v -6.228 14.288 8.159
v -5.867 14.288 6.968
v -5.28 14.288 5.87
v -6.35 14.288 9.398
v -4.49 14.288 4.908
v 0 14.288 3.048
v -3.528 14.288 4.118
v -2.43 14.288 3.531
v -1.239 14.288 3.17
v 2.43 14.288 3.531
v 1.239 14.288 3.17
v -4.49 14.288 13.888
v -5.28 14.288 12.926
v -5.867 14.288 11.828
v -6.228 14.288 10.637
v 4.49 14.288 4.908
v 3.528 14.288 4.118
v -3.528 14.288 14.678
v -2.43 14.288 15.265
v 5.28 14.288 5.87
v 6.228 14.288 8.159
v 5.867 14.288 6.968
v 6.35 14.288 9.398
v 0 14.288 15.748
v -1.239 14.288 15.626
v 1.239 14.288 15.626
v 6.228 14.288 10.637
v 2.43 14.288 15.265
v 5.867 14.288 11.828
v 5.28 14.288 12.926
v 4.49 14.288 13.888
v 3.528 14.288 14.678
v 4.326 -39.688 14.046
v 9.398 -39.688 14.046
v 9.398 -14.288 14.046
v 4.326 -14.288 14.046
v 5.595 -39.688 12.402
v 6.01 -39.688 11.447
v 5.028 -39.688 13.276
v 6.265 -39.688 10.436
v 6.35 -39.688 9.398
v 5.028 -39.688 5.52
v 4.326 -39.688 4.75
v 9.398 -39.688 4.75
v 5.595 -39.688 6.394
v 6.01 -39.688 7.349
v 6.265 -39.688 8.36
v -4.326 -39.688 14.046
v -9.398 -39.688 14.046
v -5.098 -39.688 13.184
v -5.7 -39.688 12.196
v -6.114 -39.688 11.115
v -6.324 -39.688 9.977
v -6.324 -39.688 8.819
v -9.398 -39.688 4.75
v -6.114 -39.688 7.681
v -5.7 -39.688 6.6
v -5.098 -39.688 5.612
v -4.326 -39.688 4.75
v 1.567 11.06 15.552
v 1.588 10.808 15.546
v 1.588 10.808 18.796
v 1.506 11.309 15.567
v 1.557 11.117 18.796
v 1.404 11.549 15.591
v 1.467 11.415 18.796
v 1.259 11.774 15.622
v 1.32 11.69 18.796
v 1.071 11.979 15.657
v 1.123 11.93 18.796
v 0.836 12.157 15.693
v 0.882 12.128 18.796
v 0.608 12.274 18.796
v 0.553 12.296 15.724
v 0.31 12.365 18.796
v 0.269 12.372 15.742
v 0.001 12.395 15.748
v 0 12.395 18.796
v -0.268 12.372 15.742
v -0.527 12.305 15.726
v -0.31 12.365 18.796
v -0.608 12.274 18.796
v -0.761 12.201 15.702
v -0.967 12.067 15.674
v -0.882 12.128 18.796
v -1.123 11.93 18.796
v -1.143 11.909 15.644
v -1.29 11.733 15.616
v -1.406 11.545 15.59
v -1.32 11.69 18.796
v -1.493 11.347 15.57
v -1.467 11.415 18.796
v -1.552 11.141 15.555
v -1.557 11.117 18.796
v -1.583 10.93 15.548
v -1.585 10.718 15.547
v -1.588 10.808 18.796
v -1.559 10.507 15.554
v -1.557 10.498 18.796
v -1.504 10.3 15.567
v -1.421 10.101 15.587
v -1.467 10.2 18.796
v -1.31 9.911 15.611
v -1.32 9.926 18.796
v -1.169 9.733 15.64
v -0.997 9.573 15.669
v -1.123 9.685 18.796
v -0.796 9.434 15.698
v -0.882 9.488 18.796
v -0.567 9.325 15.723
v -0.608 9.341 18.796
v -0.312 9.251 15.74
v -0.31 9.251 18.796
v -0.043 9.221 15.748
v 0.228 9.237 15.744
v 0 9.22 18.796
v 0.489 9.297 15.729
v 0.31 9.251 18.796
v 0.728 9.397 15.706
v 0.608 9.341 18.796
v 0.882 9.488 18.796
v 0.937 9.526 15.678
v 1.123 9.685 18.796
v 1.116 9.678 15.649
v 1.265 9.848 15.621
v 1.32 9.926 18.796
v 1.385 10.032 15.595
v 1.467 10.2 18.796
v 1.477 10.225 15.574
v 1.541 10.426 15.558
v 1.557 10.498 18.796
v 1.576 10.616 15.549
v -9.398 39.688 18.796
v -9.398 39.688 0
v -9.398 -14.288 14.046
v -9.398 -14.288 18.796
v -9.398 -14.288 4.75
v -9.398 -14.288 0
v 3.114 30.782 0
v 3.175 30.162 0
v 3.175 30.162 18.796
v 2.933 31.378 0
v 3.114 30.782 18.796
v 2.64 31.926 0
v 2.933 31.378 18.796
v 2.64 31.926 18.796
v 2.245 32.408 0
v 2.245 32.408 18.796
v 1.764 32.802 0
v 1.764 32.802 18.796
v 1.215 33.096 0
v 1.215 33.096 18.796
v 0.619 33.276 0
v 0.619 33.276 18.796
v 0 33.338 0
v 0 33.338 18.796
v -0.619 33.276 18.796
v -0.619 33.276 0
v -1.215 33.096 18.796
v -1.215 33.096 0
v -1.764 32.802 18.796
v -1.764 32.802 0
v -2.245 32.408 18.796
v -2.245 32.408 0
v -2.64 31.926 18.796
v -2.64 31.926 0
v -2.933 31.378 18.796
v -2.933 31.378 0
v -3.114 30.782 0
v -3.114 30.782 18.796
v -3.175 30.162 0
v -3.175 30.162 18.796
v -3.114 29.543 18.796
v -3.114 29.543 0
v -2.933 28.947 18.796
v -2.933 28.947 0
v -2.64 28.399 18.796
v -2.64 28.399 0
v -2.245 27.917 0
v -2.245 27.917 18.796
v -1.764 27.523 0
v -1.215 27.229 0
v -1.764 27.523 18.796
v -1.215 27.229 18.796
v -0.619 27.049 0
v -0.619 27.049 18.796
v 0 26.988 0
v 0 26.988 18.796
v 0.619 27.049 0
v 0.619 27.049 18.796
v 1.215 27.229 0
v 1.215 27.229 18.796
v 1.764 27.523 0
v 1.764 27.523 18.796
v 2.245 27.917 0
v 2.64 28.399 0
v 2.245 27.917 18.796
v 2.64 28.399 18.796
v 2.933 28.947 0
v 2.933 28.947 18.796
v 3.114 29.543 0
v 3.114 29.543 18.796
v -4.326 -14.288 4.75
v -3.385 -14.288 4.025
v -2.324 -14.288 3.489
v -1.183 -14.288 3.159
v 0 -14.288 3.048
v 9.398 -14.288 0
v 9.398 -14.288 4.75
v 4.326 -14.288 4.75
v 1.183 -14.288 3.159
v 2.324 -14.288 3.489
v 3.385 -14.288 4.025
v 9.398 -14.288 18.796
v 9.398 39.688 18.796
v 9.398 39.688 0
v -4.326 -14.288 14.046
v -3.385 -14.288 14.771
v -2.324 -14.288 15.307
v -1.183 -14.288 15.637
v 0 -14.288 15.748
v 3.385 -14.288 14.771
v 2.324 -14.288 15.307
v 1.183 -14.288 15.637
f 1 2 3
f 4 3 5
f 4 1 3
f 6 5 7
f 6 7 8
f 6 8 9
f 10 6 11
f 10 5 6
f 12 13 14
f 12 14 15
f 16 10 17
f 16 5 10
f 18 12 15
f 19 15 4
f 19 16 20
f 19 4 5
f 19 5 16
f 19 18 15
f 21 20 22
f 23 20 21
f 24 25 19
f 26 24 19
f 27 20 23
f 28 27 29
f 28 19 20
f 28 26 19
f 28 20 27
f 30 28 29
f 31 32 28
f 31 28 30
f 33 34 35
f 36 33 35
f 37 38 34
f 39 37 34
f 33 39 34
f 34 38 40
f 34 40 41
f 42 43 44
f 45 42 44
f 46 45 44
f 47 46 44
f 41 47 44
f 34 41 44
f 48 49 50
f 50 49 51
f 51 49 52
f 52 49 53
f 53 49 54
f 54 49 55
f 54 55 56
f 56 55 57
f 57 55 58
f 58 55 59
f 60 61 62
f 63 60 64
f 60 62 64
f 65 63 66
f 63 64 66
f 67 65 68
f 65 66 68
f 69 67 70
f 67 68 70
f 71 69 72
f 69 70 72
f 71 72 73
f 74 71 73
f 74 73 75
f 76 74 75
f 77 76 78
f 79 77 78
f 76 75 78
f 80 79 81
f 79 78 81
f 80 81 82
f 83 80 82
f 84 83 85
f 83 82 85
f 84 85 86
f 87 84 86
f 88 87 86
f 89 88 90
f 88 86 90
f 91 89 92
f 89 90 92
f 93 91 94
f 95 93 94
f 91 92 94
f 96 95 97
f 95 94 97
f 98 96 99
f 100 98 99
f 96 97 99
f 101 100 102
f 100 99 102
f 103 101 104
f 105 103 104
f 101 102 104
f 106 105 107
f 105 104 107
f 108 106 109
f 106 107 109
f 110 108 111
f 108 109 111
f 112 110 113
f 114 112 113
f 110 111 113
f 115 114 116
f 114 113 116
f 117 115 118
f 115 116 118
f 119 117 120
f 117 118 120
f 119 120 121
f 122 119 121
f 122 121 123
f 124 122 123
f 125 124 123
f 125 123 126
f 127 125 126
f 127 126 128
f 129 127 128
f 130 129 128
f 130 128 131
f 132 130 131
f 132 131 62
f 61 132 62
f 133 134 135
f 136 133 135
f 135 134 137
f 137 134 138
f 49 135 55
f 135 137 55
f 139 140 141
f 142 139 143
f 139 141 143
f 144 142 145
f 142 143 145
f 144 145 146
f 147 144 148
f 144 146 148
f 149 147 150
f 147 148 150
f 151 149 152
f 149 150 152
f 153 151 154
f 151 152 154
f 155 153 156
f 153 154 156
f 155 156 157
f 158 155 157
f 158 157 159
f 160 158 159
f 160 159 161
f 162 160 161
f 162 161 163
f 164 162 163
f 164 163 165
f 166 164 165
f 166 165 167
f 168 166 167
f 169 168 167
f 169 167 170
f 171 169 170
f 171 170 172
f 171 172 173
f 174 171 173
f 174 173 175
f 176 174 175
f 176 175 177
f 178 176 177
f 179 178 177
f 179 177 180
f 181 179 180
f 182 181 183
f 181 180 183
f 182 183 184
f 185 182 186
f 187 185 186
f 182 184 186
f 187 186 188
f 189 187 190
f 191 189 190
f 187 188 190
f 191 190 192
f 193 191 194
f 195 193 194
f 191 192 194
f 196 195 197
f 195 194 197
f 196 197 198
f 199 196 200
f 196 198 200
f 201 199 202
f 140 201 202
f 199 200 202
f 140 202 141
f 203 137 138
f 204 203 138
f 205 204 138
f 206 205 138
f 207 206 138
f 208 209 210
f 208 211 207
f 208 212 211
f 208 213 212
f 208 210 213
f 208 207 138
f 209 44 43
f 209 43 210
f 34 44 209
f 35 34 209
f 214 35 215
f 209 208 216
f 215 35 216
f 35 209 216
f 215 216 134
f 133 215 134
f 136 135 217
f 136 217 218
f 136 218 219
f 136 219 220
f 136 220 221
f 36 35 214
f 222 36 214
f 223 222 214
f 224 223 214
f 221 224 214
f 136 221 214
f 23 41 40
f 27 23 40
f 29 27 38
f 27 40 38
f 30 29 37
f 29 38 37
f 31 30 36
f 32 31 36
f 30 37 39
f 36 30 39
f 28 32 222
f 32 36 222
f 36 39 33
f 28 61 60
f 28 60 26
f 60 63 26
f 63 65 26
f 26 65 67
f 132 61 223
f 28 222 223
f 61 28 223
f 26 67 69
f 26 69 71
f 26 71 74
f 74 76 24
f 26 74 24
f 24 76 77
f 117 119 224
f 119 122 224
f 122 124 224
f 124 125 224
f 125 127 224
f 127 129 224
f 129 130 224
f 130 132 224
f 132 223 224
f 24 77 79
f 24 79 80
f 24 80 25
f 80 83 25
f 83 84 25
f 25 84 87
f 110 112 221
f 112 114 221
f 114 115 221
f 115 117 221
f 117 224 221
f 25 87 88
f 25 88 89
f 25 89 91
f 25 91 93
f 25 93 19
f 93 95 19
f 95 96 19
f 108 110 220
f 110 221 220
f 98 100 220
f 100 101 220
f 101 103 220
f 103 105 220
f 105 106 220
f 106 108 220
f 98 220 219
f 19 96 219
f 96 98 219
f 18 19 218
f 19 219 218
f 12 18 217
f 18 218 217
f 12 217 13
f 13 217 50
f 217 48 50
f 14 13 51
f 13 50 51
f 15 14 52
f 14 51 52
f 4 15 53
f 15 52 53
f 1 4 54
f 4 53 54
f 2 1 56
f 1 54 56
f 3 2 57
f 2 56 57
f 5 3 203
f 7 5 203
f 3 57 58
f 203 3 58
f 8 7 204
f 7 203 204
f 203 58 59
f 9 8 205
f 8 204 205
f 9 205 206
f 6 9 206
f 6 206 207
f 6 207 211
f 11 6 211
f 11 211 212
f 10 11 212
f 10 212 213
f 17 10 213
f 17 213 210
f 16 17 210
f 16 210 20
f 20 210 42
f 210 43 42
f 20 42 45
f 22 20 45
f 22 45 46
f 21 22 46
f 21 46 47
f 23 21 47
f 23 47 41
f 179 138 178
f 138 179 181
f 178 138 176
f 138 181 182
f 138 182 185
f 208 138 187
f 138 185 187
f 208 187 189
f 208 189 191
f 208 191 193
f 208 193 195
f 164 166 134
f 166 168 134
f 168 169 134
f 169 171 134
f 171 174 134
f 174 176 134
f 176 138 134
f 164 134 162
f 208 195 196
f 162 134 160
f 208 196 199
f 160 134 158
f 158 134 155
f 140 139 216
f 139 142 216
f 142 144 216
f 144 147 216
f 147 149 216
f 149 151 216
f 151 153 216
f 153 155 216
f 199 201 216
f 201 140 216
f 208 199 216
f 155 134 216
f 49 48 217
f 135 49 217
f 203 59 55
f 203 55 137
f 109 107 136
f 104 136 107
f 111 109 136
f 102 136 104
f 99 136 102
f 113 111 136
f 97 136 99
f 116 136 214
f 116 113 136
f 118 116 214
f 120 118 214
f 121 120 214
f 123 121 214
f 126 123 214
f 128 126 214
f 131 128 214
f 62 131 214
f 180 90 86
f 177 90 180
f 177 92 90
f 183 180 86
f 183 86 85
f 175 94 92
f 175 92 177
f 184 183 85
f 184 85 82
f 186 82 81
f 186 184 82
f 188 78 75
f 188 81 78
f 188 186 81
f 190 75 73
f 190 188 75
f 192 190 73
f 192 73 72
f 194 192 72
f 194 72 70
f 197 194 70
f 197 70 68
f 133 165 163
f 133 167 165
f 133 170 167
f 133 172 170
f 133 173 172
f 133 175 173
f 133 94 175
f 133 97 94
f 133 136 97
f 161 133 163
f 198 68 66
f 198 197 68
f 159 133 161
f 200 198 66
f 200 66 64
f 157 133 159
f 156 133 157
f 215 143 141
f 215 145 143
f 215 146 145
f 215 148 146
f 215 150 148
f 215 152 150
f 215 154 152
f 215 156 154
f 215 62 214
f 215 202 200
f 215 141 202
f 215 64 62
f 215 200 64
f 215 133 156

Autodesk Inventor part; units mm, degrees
ref_plane "YZ Plane" through (0, 0, 0) normal (1, 0, 0) x (0, 1, 0)
ref_plane "XZ Plane" through (0, 0, 0) normal (0, 1, 0) x (-1, 0, 0)
ref_plane "XY Plane" through (0, 0, 0) normal (0, 0, 1) x (1, 0, 0)
sketch "Sketch1" plane through (0, 0, 0) normal (0, 0, 1) x (1, 0, 0)
  line L0 (-9.398, -39.6875) -> (9.398, -39.6875)
  line L1 (9.398, -39.6875) -> (9.398, 39.6875)
  line L2 (9.398, 39.6875) -> (-9.398, 39.6875)
  line L3 (-9.398, 39.6875) -> (-9.398, -39.6875)
  line L4 (-9.398, -39.6875) -> (9.398, 39.6875) construction
  line L5 (9.398, -39.6875) -> (-9.398, 39.6875) construction
  point P0 (0, 0)
  dimension "d0" = 18.796
  dimension "d1" = 79.375
extrude "Extrusion1" add sketch "Sketch1" along normal blind 18.796
sketch "Sketch2" plane through (0, 0, 18.796) normal (0, 0, 1) x (1, 0, 0)
  circle A0 centre (0, 30.1625) radius 3.175
  line L0 (9.398, -39.6875) -> (9.398, 39.6875) projected
  line L1 (9.398, 39.6875) -> (-9.398, 39.6875) projected
  point P0 (0, 0)
  dimension "d4" = 6.35
  dimension "d5" = 9.398
  dimension "d6" = 9.525
extrude "Extrusion2" cut sketch "Sketch2" against normal blind 18.796
sketch "Sketch3" plane through (0, 0, 18.796) normal (0, 0, 1) x (1, 0, 0)
  circle A0 centre (0, 10.8077) radius 1.5875
  line L0 (9.398, -39.6875) -> (9.398, 39.6875) projected
  line L1 (9.398, 39.6875) -> (-9.398, 39.6875) projected
  point P0 (0, 0)
  dimension "d9" = 3.175
  dimension "d10" = 9.398
  dimension "d11" = 28.8798
extrude "Extrusion3" cut sketch "Sketch3" against normal blind 9.398
sketch "Sketch4" plane through (-9.398, -39.6875, 0) normal (0, -1, 0) x (1, 0, 0)
  circle A0 centre (9.398, 9.398) radius 6.35
  line L0 (18.796, 0) -> (18.796, 18.796) projected
  line L1 (0, 0) -> (18.796, 0) projected
  point P0 (9.398, 0)
  dimension "d14" = 12.7
  dimension "d15" = 9.398
  dimension "d16" = 9.398
extrude "Extrusion4" cut sketch "Sketch4" against normal blind 53.975
sketch "Sketch5" plane through (9.398, -39.6875, 0) normal (1, 0, 0) x (0, 0, -1)
  line L0 (-18.796, 79.375) -> (-18.796, 0) projected
  line L1 (-18.796, 0) -> (-14.0462, 0)
  line L2 (-14.0462, 0) -> (-14.0462, 25.4)
  line L3 (-14.0462, 25.4) -> (-18.796, 25.4)
  line L4 (-18.796, 25.4) -> (-18.796, 0)
  line L5 (0, 0) -> (-4.7498, 0)
  line L6 (-4.7498, 0) -> (-4.7498, 25.4)
  line L7 (-4.7498, 25.4) -> (0, 25.4)
  line L8 (0, 25.4) -> (0, 0)
  line L9 (0, 79.375) -> (-18.796, 79.375) projected
  line L10 (0, 0) -> (0, 79.375) projected
  point P0 (0, 39.6875)
  dimension "d19" = 53.975
  dimension "d20" = 4.7498
  dimension "d21" = 4.7498
  dimension "d22" = 0
extrude "Extrusion5" cut sketch "Sketch5" against normal blind 53.975
properties part number "Piston Block"
